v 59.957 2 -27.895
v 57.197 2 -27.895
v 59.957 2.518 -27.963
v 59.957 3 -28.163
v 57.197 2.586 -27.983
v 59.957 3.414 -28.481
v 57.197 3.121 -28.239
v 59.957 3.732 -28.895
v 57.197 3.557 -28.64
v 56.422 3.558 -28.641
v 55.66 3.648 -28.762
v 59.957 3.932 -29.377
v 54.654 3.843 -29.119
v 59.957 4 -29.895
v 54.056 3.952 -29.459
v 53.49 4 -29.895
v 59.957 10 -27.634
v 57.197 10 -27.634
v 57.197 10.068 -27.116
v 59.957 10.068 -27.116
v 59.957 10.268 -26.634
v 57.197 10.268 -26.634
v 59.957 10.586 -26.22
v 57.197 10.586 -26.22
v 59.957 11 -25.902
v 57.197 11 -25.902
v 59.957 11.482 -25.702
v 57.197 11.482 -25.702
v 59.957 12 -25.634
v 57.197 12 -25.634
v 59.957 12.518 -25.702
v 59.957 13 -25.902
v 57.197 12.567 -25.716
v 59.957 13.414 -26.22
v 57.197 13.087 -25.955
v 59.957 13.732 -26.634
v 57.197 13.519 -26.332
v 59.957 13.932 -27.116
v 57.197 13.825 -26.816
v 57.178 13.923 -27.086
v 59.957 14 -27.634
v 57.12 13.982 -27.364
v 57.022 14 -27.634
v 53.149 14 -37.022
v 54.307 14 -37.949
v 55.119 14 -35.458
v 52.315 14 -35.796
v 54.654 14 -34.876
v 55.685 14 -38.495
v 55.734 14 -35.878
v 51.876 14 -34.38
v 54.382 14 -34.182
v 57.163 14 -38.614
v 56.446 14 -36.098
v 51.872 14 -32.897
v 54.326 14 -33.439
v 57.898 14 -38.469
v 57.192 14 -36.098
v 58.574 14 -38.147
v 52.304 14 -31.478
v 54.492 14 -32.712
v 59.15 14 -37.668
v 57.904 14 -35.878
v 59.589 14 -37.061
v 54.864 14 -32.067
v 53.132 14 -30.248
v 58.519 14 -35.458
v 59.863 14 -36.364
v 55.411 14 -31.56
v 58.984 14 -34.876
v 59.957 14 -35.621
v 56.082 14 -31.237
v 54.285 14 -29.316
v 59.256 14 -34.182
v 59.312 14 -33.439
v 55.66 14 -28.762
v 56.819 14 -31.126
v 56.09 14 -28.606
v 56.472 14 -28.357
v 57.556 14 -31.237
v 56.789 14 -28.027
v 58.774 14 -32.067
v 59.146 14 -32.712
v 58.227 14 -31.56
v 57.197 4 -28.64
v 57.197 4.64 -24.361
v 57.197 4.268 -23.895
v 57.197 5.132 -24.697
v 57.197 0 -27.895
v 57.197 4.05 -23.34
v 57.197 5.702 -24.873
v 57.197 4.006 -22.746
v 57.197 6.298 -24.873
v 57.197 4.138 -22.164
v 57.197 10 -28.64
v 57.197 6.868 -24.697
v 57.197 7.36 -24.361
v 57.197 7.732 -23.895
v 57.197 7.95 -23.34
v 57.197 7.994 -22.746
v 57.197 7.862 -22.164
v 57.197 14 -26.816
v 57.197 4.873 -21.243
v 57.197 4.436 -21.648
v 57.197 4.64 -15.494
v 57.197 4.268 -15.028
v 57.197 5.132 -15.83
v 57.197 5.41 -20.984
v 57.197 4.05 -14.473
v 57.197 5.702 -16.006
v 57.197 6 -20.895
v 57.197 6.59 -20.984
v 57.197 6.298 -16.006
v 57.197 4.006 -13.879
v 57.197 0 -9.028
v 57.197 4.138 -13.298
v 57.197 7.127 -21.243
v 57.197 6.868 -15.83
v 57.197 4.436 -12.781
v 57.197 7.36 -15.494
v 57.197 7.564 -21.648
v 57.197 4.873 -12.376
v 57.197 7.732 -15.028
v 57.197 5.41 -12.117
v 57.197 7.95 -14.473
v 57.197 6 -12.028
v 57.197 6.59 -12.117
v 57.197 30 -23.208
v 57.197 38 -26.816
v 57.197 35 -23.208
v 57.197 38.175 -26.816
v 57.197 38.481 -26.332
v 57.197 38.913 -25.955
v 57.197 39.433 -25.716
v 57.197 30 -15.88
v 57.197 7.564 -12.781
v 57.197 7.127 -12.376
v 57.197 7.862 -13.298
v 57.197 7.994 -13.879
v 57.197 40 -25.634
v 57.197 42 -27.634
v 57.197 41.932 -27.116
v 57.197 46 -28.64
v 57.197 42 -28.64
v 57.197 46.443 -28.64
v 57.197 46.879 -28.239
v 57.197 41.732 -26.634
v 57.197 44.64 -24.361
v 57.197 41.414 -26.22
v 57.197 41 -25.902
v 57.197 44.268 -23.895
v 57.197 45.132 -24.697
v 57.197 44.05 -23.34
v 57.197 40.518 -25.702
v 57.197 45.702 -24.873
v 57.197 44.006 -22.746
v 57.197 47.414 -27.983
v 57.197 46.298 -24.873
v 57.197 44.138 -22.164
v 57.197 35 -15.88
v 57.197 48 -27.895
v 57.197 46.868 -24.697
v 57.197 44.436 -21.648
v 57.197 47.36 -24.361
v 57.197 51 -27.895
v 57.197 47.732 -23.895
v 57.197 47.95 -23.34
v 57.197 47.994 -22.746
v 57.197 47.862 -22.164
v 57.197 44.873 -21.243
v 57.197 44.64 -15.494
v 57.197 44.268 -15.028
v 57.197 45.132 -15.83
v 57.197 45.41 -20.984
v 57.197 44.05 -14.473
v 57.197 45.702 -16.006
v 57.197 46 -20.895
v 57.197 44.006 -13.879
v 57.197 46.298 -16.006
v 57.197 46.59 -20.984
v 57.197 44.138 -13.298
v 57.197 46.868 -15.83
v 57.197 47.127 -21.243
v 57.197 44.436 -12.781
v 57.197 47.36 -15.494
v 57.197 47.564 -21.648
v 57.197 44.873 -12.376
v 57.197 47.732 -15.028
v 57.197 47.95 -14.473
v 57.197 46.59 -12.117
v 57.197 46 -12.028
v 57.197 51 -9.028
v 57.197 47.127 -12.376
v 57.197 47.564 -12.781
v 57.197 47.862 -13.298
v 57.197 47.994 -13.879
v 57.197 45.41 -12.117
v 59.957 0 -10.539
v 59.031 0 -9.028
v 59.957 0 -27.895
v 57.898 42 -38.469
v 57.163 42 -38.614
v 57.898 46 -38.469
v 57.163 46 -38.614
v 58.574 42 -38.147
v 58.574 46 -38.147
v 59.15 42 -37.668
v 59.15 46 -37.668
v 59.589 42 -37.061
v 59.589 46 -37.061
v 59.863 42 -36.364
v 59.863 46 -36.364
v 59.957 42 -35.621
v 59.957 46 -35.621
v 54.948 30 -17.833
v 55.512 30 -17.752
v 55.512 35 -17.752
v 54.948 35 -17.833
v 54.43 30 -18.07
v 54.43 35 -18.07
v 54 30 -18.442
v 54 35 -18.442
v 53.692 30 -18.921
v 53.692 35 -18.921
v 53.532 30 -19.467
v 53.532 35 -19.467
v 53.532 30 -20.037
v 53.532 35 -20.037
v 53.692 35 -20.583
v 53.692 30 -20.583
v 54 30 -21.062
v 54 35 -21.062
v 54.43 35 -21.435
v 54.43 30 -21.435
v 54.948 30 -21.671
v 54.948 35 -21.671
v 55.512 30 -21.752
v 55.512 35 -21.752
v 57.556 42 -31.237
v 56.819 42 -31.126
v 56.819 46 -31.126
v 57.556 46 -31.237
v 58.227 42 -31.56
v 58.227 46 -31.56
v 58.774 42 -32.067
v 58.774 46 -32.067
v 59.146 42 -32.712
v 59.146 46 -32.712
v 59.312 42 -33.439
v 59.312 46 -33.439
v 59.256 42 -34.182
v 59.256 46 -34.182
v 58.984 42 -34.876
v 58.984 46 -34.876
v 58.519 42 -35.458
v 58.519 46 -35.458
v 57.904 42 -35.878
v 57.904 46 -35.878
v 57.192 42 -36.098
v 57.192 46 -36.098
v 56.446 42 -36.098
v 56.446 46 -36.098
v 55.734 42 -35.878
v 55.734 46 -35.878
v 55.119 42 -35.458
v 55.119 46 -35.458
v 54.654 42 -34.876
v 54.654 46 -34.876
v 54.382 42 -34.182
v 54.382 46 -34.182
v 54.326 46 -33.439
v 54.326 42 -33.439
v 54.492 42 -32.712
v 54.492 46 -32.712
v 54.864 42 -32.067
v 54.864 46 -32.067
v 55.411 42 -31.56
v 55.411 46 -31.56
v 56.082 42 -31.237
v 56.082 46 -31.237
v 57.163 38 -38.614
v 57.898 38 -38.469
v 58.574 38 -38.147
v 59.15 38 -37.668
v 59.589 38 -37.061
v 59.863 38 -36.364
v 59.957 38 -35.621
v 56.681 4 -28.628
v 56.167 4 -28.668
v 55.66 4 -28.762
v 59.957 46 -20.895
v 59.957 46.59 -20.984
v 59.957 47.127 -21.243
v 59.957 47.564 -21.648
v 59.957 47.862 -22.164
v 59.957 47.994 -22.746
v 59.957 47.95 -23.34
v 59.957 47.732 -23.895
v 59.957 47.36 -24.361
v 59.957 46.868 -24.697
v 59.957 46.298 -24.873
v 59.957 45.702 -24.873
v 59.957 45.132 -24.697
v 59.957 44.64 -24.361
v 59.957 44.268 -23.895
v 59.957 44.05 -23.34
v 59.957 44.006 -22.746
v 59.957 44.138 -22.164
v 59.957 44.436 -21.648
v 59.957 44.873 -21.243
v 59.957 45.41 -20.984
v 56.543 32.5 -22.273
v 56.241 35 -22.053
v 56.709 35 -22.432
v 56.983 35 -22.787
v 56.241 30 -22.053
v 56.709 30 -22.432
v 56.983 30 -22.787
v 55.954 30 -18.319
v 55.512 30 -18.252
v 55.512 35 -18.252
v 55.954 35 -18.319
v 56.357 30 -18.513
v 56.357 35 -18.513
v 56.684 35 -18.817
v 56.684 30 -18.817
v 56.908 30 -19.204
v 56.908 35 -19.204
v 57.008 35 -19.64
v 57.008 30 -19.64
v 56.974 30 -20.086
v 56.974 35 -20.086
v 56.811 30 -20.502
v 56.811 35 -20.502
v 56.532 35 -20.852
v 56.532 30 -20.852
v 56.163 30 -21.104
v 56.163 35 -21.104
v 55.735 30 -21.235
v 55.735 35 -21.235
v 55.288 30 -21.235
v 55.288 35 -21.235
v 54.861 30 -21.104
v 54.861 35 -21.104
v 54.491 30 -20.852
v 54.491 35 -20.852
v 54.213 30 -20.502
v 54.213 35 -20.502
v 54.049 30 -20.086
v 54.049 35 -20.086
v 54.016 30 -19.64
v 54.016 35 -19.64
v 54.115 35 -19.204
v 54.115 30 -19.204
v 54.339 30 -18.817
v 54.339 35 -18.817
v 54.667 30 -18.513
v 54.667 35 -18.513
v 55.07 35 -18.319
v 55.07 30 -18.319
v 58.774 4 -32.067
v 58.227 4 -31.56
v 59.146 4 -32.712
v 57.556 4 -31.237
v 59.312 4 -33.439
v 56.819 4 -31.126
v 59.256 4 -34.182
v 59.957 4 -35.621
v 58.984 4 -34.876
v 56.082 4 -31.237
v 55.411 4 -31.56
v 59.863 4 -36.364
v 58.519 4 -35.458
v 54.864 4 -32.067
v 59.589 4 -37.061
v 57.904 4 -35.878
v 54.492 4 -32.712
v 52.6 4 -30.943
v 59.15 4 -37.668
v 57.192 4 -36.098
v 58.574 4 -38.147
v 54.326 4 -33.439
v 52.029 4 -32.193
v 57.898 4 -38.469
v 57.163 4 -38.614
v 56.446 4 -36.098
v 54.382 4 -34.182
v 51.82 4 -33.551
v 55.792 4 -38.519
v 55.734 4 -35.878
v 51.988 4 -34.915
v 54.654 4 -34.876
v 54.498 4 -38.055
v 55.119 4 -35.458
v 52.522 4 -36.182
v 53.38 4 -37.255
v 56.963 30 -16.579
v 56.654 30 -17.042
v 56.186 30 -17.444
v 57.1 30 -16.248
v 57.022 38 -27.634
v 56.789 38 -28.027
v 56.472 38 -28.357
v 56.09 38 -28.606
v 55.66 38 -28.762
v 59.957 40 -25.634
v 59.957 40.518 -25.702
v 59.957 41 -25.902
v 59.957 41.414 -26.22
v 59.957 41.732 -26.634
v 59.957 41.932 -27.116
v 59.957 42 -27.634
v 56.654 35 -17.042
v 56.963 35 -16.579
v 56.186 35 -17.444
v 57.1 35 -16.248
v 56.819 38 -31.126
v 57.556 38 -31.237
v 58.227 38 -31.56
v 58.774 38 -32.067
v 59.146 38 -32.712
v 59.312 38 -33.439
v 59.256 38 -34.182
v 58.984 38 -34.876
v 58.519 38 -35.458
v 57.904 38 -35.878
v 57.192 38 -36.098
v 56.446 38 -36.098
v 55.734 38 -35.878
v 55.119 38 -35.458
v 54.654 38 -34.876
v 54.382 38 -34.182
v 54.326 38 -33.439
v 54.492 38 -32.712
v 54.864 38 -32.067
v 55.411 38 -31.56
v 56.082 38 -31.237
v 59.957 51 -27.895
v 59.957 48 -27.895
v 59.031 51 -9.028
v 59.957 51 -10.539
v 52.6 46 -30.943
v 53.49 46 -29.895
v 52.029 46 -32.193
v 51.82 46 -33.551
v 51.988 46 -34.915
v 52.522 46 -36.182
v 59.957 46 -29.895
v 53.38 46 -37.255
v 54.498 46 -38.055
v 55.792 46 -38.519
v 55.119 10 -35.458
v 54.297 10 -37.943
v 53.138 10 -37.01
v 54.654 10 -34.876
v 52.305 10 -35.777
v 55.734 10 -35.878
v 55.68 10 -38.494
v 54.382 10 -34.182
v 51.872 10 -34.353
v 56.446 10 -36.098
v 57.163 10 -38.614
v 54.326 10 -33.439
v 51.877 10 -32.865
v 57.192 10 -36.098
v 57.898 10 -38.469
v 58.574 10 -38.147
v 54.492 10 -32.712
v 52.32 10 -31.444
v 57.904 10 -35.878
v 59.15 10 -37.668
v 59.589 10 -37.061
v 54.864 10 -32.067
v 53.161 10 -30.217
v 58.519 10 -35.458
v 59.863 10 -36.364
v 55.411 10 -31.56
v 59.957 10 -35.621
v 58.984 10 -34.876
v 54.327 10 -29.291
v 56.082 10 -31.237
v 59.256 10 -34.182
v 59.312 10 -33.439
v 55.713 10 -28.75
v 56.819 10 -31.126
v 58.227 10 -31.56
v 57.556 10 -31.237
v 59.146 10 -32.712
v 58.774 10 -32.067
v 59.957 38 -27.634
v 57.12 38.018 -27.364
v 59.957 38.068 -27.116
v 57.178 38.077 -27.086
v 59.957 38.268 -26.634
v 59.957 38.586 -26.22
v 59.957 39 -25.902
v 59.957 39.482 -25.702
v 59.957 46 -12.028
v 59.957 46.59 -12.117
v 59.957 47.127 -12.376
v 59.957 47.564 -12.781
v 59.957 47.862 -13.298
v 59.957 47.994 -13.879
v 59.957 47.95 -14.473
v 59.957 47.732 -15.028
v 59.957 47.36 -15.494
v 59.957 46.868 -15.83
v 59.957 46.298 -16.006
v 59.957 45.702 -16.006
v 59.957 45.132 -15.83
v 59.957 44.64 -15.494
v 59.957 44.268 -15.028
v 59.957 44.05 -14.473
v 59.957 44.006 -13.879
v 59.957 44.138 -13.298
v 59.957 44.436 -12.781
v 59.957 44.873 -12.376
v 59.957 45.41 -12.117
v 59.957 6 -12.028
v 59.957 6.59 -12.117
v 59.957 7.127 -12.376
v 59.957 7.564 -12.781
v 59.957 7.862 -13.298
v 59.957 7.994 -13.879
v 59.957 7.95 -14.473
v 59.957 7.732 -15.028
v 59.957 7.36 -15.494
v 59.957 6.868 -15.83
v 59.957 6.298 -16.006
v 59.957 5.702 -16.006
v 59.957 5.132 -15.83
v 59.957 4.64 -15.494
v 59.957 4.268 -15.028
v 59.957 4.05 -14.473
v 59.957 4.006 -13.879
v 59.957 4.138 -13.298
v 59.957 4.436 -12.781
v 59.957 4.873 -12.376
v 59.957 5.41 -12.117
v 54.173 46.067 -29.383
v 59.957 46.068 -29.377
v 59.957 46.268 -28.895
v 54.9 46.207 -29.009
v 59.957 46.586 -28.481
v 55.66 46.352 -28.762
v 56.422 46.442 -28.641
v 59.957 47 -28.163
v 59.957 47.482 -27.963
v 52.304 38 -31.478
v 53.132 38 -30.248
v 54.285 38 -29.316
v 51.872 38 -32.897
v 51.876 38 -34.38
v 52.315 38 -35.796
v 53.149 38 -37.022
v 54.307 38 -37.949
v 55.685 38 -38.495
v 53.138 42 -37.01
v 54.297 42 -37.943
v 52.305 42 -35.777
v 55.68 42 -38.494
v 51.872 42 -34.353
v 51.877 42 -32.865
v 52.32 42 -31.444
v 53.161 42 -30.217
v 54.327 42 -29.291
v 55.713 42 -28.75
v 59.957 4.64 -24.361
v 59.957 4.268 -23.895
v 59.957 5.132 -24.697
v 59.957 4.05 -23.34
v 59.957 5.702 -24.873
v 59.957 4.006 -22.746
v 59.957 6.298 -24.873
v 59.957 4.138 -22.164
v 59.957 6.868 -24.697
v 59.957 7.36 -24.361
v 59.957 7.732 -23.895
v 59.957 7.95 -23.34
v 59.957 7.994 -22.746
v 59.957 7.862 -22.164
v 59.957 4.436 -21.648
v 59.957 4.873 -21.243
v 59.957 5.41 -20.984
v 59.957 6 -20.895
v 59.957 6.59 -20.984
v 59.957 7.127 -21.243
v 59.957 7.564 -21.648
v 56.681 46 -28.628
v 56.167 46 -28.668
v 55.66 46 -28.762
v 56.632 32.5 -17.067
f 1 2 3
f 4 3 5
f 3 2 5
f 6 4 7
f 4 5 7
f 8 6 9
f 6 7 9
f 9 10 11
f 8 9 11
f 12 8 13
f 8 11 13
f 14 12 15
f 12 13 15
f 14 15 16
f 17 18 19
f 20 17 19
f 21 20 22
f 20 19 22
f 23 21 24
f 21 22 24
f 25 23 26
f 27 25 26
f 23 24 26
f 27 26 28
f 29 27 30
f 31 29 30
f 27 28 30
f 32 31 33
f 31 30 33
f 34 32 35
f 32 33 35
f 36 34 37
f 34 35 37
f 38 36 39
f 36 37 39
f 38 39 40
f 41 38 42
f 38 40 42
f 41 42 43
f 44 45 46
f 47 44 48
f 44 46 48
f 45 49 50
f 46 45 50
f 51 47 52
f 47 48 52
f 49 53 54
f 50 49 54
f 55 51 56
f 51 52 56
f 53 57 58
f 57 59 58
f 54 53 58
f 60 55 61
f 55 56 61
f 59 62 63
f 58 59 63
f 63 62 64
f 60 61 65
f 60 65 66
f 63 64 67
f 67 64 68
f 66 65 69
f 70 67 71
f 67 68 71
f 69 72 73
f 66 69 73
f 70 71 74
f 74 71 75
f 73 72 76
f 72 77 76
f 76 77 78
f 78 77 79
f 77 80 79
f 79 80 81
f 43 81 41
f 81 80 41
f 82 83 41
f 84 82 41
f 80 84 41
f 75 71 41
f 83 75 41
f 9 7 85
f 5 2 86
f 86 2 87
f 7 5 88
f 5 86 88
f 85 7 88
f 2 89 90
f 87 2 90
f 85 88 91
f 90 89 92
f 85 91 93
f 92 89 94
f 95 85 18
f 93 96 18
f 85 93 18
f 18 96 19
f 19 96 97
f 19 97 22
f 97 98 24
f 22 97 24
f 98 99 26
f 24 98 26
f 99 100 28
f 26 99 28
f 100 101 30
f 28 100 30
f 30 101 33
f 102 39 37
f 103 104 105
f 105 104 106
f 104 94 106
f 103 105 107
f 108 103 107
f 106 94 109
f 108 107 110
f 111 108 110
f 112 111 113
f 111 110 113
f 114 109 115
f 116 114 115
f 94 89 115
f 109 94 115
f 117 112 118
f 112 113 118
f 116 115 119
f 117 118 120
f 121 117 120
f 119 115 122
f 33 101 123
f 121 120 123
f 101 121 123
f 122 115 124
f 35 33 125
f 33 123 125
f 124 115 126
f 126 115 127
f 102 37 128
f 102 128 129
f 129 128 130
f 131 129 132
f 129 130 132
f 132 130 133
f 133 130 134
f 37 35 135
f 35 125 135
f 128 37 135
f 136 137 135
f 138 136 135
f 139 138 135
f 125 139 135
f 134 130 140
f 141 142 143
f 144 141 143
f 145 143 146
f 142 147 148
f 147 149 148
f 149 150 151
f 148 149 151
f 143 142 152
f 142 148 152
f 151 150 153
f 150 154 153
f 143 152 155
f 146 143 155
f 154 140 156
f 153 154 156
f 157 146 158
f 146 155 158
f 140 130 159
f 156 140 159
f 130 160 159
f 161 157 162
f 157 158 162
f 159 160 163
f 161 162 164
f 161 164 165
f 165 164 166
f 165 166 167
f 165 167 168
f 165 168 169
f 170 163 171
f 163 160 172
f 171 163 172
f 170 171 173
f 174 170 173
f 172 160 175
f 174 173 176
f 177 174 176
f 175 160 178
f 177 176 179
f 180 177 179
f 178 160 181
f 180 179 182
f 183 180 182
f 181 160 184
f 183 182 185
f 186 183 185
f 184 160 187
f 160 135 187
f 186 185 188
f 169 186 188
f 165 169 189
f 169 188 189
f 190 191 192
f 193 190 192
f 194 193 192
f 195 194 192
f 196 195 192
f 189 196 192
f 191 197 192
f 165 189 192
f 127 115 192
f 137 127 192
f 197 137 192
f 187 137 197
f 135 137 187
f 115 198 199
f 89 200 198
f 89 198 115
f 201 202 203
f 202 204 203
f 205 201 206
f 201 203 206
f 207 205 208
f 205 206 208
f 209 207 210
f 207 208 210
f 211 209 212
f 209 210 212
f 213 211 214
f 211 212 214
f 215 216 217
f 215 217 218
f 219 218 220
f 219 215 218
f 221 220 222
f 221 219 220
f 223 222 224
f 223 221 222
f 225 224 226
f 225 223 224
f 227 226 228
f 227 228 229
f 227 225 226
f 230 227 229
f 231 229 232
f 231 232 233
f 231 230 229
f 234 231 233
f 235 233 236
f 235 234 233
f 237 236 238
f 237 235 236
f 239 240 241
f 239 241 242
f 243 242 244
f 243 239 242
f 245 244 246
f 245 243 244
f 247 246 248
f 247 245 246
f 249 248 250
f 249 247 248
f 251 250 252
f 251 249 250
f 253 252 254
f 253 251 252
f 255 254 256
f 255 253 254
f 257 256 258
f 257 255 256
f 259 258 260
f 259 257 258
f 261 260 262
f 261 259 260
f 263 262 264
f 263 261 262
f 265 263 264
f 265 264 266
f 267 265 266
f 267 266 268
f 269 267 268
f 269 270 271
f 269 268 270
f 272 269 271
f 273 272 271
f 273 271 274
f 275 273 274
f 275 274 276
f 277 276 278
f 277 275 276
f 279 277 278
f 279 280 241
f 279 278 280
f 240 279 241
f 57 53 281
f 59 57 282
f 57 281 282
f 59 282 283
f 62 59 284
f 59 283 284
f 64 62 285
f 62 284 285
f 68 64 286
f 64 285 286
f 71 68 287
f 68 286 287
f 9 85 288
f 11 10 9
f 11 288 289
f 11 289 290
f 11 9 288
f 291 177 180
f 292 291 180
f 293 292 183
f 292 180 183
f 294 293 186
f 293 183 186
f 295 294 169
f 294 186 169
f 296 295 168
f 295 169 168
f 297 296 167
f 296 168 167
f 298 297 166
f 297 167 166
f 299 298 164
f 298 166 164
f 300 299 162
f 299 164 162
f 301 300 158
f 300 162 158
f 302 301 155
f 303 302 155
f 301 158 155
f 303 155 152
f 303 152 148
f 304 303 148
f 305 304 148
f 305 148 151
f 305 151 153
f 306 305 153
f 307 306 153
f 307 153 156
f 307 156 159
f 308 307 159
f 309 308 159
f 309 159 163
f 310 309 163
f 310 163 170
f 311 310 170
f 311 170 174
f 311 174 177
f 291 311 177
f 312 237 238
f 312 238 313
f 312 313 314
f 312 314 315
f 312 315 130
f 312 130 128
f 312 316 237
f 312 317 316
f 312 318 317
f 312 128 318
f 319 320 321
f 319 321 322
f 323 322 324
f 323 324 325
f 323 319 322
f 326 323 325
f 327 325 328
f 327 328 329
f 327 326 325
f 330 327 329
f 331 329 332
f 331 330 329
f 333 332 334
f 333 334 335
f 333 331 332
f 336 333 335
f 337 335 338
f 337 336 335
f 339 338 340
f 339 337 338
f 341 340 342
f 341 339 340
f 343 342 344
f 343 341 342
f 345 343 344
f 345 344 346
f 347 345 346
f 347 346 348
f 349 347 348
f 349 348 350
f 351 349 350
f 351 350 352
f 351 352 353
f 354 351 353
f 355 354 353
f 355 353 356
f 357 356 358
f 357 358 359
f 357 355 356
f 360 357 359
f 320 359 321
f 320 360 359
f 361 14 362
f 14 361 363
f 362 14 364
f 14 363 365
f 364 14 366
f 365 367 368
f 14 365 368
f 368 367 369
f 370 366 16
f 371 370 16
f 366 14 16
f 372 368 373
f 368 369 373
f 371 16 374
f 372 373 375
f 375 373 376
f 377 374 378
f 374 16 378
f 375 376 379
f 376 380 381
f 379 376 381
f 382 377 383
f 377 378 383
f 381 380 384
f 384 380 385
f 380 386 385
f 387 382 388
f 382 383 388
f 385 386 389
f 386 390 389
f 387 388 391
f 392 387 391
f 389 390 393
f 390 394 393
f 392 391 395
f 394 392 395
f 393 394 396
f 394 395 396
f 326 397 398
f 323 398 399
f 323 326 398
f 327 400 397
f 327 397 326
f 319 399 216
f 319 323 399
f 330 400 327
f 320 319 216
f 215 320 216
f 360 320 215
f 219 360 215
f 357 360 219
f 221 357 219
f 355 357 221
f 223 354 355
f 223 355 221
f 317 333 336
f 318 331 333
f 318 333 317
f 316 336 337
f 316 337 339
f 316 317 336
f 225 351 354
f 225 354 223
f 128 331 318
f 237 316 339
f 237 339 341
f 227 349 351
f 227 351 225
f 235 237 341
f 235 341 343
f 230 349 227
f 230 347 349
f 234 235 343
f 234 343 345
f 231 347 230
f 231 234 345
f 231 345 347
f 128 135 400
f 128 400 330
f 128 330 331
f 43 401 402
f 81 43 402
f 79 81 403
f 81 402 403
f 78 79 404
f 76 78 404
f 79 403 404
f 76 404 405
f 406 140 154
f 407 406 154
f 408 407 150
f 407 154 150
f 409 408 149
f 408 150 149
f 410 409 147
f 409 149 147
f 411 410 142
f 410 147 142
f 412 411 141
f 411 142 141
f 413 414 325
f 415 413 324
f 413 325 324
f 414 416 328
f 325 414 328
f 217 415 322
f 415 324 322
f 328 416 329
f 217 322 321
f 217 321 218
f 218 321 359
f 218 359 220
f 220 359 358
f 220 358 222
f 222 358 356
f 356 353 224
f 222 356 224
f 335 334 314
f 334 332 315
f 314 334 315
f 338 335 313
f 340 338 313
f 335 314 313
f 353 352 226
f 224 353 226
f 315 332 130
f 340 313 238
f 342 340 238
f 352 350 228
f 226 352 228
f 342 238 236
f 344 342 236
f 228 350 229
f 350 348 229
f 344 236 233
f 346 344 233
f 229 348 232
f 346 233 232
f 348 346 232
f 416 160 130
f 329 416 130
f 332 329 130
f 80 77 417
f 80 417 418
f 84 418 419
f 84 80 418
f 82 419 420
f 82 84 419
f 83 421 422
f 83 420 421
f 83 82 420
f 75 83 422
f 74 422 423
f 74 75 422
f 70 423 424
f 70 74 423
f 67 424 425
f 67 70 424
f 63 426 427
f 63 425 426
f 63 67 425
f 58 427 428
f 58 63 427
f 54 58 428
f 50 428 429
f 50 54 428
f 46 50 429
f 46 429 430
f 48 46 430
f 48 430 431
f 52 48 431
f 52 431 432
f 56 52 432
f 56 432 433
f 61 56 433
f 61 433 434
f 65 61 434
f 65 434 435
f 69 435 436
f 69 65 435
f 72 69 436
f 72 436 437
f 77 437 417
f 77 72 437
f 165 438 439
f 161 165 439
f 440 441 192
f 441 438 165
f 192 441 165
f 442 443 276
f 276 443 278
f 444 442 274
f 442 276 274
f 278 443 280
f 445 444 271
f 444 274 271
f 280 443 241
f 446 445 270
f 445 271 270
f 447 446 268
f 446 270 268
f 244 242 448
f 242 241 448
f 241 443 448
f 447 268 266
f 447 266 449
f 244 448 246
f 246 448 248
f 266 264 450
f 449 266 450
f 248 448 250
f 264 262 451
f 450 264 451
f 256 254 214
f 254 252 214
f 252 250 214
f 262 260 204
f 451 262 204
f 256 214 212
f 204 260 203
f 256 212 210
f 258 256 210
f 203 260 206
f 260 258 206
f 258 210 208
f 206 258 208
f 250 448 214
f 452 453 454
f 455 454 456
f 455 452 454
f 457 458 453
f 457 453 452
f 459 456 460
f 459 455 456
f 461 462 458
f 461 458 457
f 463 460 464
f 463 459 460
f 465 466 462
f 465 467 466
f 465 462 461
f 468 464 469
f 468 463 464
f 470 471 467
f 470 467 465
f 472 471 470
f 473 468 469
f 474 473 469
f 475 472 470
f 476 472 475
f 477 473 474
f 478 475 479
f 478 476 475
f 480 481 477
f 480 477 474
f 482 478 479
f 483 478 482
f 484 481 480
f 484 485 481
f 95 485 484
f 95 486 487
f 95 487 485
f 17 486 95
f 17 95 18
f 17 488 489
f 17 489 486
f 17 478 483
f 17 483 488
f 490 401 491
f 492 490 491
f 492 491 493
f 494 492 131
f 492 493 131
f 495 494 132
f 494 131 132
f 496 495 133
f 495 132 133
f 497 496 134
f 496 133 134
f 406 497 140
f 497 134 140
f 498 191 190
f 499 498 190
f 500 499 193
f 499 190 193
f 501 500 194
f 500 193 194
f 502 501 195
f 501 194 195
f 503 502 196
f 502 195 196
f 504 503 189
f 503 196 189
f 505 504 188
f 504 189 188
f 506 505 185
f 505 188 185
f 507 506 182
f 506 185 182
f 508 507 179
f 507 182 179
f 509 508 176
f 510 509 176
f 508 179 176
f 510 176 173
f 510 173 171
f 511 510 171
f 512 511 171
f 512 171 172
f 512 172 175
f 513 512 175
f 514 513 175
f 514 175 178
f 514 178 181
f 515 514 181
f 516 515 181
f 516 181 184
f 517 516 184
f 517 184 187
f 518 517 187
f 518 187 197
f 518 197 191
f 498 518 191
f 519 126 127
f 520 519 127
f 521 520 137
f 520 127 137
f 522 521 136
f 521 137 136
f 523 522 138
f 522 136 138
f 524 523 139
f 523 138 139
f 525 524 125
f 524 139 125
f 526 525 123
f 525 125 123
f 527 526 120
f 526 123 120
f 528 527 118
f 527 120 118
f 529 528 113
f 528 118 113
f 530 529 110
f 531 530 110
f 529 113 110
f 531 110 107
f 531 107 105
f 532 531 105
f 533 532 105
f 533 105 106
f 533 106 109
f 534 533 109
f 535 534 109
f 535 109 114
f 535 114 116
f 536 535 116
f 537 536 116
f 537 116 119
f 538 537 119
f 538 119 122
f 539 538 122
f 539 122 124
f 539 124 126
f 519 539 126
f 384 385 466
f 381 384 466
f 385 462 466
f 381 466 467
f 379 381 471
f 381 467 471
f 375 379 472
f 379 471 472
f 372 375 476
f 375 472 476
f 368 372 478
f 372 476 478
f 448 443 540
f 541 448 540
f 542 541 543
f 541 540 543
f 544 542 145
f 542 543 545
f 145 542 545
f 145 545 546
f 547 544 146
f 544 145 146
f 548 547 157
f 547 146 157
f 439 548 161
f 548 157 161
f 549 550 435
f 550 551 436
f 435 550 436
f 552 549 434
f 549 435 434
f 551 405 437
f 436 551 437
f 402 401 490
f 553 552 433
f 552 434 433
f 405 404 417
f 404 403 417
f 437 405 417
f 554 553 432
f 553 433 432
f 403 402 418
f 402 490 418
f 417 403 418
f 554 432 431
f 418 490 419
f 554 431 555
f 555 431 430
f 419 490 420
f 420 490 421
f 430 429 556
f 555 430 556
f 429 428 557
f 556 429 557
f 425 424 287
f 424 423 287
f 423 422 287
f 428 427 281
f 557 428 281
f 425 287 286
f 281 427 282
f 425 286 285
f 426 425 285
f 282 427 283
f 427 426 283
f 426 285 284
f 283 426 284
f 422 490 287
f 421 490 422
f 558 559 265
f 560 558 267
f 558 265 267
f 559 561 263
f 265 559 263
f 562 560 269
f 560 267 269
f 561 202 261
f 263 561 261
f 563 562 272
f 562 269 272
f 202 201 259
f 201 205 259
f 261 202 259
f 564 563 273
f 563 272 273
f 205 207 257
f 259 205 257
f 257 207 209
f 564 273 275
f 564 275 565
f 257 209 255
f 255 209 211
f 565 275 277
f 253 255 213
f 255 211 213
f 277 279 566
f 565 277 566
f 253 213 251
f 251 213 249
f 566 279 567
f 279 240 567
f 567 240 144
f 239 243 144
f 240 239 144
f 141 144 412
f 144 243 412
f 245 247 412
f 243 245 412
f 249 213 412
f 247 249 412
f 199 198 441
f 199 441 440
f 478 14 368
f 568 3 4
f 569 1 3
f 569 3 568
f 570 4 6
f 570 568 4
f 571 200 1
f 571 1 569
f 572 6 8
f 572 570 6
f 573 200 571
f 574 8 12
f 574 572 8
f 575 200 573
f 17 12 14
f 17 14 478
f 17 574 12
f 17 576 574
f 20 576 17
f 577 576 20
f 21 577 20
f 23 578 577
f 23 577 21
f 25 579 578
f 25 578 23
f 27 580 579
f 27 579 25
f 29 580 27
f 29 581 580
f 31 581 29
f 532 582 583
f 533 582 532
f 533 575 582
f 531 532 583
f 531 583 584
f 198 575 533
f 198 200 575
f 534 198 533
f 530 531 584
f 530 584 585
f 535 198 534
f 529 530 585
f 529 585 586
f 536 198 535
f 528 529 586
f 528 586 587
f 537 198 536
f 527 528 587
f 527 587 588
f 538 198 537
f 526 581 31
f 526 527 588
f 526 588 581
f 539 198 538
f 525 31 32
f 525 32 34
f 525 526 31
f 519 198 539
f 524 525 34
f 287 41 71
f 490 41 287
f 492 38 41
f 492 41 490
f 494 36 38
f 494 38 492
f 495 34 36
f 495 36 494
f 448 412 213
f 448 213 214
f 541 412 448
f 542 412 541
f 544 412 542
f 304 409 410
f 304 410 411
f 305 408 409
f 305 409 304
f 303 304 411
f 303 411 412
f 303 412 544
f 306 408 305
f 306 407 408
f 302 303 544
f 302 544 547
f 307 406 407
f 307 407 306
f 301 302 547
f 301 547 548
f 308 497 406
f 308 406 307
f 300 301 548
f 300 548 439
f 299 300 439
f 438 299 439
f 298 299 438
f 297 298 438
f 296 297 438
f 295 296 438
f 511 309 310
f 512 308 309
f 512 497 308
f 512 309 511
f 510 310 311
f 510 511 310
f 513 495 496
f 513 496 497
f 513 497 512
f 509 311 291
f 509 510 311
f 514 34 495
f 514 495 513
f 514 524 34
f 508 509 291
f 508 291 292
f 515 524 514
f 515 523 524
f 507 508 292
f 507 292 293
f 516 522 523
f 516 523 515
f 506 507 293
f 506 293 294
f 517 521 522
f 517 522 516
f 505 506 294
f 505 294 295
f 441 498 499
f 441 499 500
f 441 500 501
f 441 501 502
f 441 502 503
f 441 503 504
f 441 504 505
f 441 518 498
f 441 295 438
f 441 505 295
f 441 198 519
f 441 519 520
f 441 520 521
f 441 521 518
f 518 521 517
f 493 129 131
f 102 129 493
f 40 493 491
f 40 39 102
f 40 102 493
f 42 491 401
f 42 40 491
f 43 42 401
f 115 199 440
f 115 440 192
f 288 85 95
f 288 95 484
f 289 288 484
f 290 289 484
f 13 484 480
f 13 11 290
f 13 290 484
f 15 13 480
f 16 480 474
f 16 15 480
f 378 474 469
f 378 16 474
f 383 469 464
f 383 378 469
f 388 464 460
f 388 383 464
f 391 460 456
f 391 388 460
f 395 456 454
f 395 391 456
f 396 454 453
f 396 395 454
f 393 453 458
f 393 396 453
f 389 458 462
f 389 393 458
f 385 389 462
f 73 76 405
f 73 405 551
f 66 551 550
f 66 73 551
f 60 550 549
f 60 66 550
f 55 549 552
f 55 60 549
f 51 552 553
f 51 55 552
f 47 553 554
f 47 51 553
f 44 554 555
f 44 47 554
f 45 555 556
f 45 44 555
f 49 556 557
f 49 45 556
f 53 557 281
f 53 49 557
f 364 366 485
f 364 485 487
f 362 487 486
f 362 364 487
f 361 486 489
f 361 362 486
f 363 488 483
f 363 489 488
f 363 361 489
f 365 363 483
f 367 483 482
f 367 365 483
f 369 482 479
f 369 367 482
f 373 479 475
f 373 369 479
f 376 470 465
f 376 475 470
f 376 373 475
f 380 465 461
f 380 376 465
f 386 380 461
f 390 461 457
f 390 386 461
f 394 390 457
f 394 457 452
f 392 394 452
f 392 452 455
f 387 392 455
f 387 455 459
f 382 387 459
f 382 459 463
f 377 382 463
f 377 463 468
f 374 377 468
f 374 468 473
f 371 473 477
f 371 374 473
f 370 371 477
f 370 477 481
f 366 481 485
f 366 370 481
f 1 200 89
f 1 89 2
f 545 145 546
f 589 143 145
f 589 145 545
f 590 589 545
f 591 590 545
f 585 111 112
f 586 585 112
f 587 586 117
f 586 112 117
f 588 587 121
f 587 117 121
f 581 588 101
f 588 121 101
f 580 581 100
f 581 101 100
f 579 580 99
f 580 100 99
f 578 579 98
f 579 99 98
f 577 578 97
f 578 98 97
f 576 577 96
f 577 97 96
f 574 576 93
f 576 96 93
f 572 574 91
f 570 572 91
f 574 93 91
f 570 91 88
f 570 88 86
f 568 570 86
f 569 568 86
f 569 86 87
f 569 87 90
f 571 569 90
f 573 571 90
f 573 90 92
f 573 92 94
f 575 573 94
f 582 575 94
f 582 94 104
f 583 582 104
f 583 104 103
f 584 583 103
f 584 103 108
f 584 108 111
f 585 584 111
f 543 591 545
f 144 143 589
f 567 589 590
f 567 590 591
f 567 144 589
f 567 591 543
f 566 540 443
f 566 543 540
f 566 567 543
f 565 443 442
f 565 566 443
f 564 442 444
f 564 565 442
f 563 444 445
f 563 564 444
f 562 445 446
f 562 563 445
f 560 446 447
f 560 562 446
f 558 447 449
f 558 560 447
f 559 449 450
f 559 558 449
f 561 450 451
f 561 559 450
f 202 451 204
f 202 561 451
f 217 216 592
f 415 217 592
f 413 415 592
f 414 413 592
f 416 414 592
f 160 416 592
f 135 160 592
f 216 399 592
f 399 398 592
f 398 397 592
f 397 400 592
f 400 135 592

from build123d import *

# Parameters (mm, degrees)
SKETCH1_R           = 2.5
BOSS_EXTRUDE1_DEPTH = 51
CUT_EXTRUDE1_DEPTH  = 15
CUT_EXTRUDE2_DEPTH  = 12.5
SKETCH4_W           = 10.949964099
SKETCH4_H           = 4
CUT_EXTRUDE3_DEPTH  = 25
SKETCH5_R           = 2
CUT_EXTRUDE4_DEPTH  = 10
FILLET4_R           = 2
FILLET5_R           = 3
FILLET6_START       = 57.196631886
FILLET6_DEPTH       = 2.760049196
FILLET6_START_2     = 53.489934113
FILLET6_2_DEPTH     = 3.979721459
FILLET6_START_3     = 57.021910195
FILLET6_3_DEPTH     = 0.447745377
FILLET6_START_4     = 1
FILLET6_4_DEPTH     = 48
FILLET6_START_5     = 46
FILLET6_5_DEPTH     = 2
FILLET6_START_6     = 2
FILLET6_6_DEPTH     = 2
SKETCH6_R           = 1.5
BOSS_EXTRUDE2_DEPTH = 5


with BuildPart() as part:
    # Sketch1 → Boss-Extrude1 (new body)
    with BuildSketch(Plane(origin=(0, 0, 0), x_dir=(1, 0, 0), z_dir=(0, 1, 0))):
        with BuildLine():
            Line((57.196631886, 9.028355512), (57.196631886, 28.639971463))
            ThreePointArc((57.196631886, 28.639971463), (52.044420209, 35.109942461), (59.956681082, 37.518663649))
            Line((59.956681082, 37.518663649), (59.956681082, 29.732723556))
            Line((59.956681082, 29.732723556), (59.956681082, 10.538718377))
            Line((59.956681082, 10.538718377), (59.030643937, 9.028355512))
            Line((59.030643937, 9.028355512), (57.196631886, 9.028355512))
        make_face()
        with Locations(Location((56.81904117, 33.625693603, 0), (0, 0, 270))):
            Circle(SKETCH1_R, mode=Mode.SUBTRACT)
    extrude(amount=BOSS_EXTRUDE1_DEPTH)

    # Sketch2 → Cut-Extrude1 (cut, symmetric)
    with BuildSketch(Plane(origin=(59.956681082, 0, 0), x_dir=(0, 0, -1), z_dir=(1, 0, 0))):
        Polygon((39.133835998, 10), (25.633835998, 10), (25.633835998, 14), (27.895137764, 14), (39.133835998, 14), align=None)
    extrude(amount=CUT_EXTRUDE1_DEPTH, both=True, mode=Mode.SUBTRACT)

    # Sketch3 → Cut-Extrude2 (cut, symmetric)
    with BuildSketch(Plane(origin=(59.956681082, 0, 0), x_dir=(0, 0, -1), z_dir=(1, 0, 0))):
        Polygon((41.711304396, 42), (27.895137764, 42), (25.633835998, 42), (25.633835998, 38), (41.711304396, 38), align=None)
    extrude(amount=CUT_EXTRUDE2_DEPTH, both=True, mode=Mode.SUBTRACT)

    # Sketch4 → Cut-Extrude3 (cut, symmetric)
    with BuildSketch(Plane(origin=(59.956681082, 0, 0), x_dir=(0, 0, -1), z_dir=(1, 0, 0))):
        with Locations((33.370119814, 2)):
            Rectangle(SKETCH4_W, SKETCH4_H)
        Polygon((38.845101863, 51), (30.056521444, 51), (27.895137764, 51), (27.895137764, 47), (27.895137764, 46), (38.845101863, 46), align=None)
    extrude(amount=CUT_EXTRUDE3_DEPTH, both=True, mode=Mode.SUBTRACT)

    # Sketch5 → Cut-Extrude4 (cut)
    with BuildSketch(Plane.ZY.offset(-57.196631886)):
        with Locations((-22.895137764, 46)):
            Circle(SKETCH5_R)
        with Locations((-14.028355512, 46)):
            Circle(SKETCH5_R)
        with Locations((-14.028355512, 6)):
            Circle(SKETCH5_R)
        with Locations((-22.895137764, 6)):
            Circle(SKETCH5_R)
    extrude(amount=-CUT_EXTRUDE4_DEPTH, mode=Mode.SUBTRACT)

    # Fillet4
    fillet4_edges = [part.edges().sort_by_distance(p)[0] for p in [
        (57.196631886, 26, -28.639971463),
    ]]
    fillet(fillet4_edges, radius=FILLET4_R)

    # Fillet5
    fillet5_edges = [part.edges().sort_by_distance(p)[0] for p in [
        (59.956681082, 7, -37.518663649),
        (59.956681082, 26, -37.518663649),
        (59.956681082, 44, -37.518663649),
    ]]
    fillet(fillet5_edges, radius=FILLET5_R)

    # Fillet6: read off the stored shape, not the designer's step
    # Fillet6 outline → Fillet6 (add)
    with BuildSketch(Plane.YZ.offset(FILLET6_START)):
        with BuildLine():
            Line((4, -27.895137764), (2, -27.895137764))
            ThreePointArc((2, -27.895137764), (3.414213563, -28.480924202), (4, -29.895137764))
            Line((4, -29.895137764), (4, -27.895137764))
        make_face()
        with BuildLine():
            Line((46, -27.895137764), (46, -29.895137764))
            ThreePointArc((46, -29.895137764), (46.585786437, -28.480924202), (48, -27.895137764))
            Line((48, -27.895137764), (46, -27.895137764))
        make_face()
        with BuildLine():
            Line((14, -25.633835998), (12, -25.633835998))
            ThreePointArc((12, -25.633835998), (13.414213562, -26.219622436), (14, -27.633835998))
            Line((14, -27.633835998), (14, -25.633835998))
        make_face()
        with BuildLine():
            ThreePointArc((10, -27.633835998), (10.585786438, -26.219622436), (12, -25.633835998))
            Line((12, -25.633835998), (10, -25.633835998))
            Line((10, -25.633835998), (10, -27.633835998))
        make_face()
        with BuildLine():
            Line((38, -25.633835998), (38, -27.633835998))
            ThreePointArc((38, -27.633835998), (38.585786438, -26.219622436), (40, -25.633835998))
            Line((40, -25.633835998), (38, -25.633835998))
        make_face()
        with BuildLine():
            Line((42, -25.633835998), (40, -25.633835998))
            ThreePointArc((40, -25.633835998), (41.414213562, -26.219622436), (42, -27.633835998))
            Line((42, -27.633835998), (42, -25.633835998))
        make_face()
    extrude(amount=FILLET6_DEPTH)

    # Fillet6 2 outline → Fillet6 2 (add)
    with BuildSketch(Plane.YZ.offset(FILLET6_START_2)):
        with BuildLine():
            Line((4, -27.895137764), (2, -27.895137764))
            ThreePointArc((2, -27.895137764), (3.414213563, -28.480924202), (4, -29.895137764))
            Line((4, -29.895137764), (4, -27.895137764))
        make_face()
        with BuildLine():
            Line((46, -27.895137764), (46, -29.895137764))
            ThreePointArc((46, -29.895137764), (46.585786437, -28.480924202), (48, -27.895137764))
            Line((48, -27.895137764), (46, -27.895137764))
        make_face()
    extrude(amount=FILLET6_2_DEPTH)

    # Fillet6 3 outline → Fillet6 3 (add)
    with BuildSketch(Plane.YZ.offset(FILLET6_START_3)):
        with BuildLine():
            Line((14, -25.633835998), (12, -25.633835998))
            ThreePointArc((12, -25.633835998), (13.414213562, -26.219622436), (14, -27.633835998))
            Line((14, -27.633835998), (14, -25.633835998))
        make_face()
        with BuildLine():
            Line((38, -25.633835998), (38, -27.633835998))
            ThreePointArc((38, -27.633835998), (38.585786438, -26.219622436), (40, -25.633835998))
            Line((40, -25.633835998), (38, -25.633835998))
        make_face()
    extrude(amount=FILLET6_3_DEPTH)

    # Fillet6 4 outline → Fillet6 4 (cut)
    with BuildSketch(Plane(origin=(0, 0, 0), x_dir=(1, 0, 0), z_dir=(0, 1, 0)).offset(FILLET6_START_4)):
        with BuildLine():
            ThreePointArc((56.880709526, 27.895137764), (56.354589633, 28.446988989), (55.660177396, 28.761843816))
            ThreePointArc((55.660177396, 28.761843816), (54.504616994, 29.193601463), (53.489934157, 29.895137813))
            Line((53.489934157, 29.895137813), (53.489934113, 27.895137764))
            Line((53.489934113, 27.895137764), (56.880709526, 27.895137764))
        make_face()
        with BuildLine():
            Line((57.196631886, 25.633835998), (57.196631886, 26.816303901))
            ThreePointArc((57.196631886, 26.816303901), (57.152463779, 27.234301039), (57.021910279, 27.633836035))
            Line((57.021910279, 27.633836035), (57.021910195, 25.633835998))
            Line((57.021910195, 25.633835998), (57.196631886, 25.633835998))
        make_face()
    extrude(amount=FILLET6_4_DEPTH, mode=Mode.SUBTRACT)

    # Fillet6 5 outline → Fillet6 5 (cut)
    with BuildSketch(Plane(origin=(0, 0, 0), x_dir=(1, 0, 0), z_dir=(0, 1, 0)).offset(FILLET6_START_5)):
        with BuildLine():
            Line((57.196631886, 27.895137764), (57.196631886, 28.639971463))
            ThreePointArc((57.196631886, 28.639971463), (56.423680429, 28.641349124), (55.660177396, 28.761843815))
            ThreePointArc((55.660177396, 28.761843815), (56.354589633, 28.446988989), (56.880709526, 27.895137764))
            Line((56.880709526, 27.895137764), (57.196631886, 27.895137764))
        make_face()
    extrude(amount=FILLET6_5_DEPTH, mode=Mode.SUBTRACT)

    # Fillet6 6 outline → Fillet6 6 (cut)
    with BuildSketch(Plane(origin=(0, 0, 0), x_dir=(1, 0, 0), z_dir=(0, 1, 0)).offset(FILLET6_START_6)):
        with BuildLine():
            Line((57.196631886, 27.895137764), (57.196631886, 28.639971463))
            ThreePointArc((57.196631886, 28.639971463), (56.423680429, 28.641349124), (55.660177396, 28.761843815))
            ThreePointArc((55.660177396, 28.761843815), (56.354589633, 28.446988989), (56.880709526, 27.895137764))
            Line((56.880709526, 27.895137764), (57.196631886, 27.895137764))
        make_face()
    extrude(amount=FILLET6_6_DEPTH, mode=Mode.SUBTRACT)

    # Sketch6 → Boss-Extrude2 (add)
    with BuildSketch(Plane(origin=(0, 30, 0), x_dir=(1, 0, 0), z_dir=(0, 1, 0))):
        with BuildLine():
            Line((57.196631886, 23.207838196), (57.196631886, 15.88036097))
            add(Edge.make_bspline(
                [(55.511713205, 17.752088745), (56.909946197, 17.31678815), (57.196631886, 15.88036097)],
                knots=[0, 0, 0, 1, 1, 1], degree=2))
            ThreePointArc((55.511713205, 17.752088745), (53.511713205, 19.752088745), (55.511713205, 21.752088745))
            add(Edge.make_bspline(
                [(55.511713205, 21.752088745), (56.732163203, 22.065636669), (57.196631886, 23.207838196)],
                knots=[0, 0, 0, 1, 1, 1], degree=2))
        make_face()
        with Locations(Location((55.511713205, 19.752088745, 0), (0, 0, 270))):
            Circle(SKETCH6_R, mode=Mode.SUBTRACT)
    extrude(amount=BOSS_EXTRUDE2_DEPTH)


solid = part.part
